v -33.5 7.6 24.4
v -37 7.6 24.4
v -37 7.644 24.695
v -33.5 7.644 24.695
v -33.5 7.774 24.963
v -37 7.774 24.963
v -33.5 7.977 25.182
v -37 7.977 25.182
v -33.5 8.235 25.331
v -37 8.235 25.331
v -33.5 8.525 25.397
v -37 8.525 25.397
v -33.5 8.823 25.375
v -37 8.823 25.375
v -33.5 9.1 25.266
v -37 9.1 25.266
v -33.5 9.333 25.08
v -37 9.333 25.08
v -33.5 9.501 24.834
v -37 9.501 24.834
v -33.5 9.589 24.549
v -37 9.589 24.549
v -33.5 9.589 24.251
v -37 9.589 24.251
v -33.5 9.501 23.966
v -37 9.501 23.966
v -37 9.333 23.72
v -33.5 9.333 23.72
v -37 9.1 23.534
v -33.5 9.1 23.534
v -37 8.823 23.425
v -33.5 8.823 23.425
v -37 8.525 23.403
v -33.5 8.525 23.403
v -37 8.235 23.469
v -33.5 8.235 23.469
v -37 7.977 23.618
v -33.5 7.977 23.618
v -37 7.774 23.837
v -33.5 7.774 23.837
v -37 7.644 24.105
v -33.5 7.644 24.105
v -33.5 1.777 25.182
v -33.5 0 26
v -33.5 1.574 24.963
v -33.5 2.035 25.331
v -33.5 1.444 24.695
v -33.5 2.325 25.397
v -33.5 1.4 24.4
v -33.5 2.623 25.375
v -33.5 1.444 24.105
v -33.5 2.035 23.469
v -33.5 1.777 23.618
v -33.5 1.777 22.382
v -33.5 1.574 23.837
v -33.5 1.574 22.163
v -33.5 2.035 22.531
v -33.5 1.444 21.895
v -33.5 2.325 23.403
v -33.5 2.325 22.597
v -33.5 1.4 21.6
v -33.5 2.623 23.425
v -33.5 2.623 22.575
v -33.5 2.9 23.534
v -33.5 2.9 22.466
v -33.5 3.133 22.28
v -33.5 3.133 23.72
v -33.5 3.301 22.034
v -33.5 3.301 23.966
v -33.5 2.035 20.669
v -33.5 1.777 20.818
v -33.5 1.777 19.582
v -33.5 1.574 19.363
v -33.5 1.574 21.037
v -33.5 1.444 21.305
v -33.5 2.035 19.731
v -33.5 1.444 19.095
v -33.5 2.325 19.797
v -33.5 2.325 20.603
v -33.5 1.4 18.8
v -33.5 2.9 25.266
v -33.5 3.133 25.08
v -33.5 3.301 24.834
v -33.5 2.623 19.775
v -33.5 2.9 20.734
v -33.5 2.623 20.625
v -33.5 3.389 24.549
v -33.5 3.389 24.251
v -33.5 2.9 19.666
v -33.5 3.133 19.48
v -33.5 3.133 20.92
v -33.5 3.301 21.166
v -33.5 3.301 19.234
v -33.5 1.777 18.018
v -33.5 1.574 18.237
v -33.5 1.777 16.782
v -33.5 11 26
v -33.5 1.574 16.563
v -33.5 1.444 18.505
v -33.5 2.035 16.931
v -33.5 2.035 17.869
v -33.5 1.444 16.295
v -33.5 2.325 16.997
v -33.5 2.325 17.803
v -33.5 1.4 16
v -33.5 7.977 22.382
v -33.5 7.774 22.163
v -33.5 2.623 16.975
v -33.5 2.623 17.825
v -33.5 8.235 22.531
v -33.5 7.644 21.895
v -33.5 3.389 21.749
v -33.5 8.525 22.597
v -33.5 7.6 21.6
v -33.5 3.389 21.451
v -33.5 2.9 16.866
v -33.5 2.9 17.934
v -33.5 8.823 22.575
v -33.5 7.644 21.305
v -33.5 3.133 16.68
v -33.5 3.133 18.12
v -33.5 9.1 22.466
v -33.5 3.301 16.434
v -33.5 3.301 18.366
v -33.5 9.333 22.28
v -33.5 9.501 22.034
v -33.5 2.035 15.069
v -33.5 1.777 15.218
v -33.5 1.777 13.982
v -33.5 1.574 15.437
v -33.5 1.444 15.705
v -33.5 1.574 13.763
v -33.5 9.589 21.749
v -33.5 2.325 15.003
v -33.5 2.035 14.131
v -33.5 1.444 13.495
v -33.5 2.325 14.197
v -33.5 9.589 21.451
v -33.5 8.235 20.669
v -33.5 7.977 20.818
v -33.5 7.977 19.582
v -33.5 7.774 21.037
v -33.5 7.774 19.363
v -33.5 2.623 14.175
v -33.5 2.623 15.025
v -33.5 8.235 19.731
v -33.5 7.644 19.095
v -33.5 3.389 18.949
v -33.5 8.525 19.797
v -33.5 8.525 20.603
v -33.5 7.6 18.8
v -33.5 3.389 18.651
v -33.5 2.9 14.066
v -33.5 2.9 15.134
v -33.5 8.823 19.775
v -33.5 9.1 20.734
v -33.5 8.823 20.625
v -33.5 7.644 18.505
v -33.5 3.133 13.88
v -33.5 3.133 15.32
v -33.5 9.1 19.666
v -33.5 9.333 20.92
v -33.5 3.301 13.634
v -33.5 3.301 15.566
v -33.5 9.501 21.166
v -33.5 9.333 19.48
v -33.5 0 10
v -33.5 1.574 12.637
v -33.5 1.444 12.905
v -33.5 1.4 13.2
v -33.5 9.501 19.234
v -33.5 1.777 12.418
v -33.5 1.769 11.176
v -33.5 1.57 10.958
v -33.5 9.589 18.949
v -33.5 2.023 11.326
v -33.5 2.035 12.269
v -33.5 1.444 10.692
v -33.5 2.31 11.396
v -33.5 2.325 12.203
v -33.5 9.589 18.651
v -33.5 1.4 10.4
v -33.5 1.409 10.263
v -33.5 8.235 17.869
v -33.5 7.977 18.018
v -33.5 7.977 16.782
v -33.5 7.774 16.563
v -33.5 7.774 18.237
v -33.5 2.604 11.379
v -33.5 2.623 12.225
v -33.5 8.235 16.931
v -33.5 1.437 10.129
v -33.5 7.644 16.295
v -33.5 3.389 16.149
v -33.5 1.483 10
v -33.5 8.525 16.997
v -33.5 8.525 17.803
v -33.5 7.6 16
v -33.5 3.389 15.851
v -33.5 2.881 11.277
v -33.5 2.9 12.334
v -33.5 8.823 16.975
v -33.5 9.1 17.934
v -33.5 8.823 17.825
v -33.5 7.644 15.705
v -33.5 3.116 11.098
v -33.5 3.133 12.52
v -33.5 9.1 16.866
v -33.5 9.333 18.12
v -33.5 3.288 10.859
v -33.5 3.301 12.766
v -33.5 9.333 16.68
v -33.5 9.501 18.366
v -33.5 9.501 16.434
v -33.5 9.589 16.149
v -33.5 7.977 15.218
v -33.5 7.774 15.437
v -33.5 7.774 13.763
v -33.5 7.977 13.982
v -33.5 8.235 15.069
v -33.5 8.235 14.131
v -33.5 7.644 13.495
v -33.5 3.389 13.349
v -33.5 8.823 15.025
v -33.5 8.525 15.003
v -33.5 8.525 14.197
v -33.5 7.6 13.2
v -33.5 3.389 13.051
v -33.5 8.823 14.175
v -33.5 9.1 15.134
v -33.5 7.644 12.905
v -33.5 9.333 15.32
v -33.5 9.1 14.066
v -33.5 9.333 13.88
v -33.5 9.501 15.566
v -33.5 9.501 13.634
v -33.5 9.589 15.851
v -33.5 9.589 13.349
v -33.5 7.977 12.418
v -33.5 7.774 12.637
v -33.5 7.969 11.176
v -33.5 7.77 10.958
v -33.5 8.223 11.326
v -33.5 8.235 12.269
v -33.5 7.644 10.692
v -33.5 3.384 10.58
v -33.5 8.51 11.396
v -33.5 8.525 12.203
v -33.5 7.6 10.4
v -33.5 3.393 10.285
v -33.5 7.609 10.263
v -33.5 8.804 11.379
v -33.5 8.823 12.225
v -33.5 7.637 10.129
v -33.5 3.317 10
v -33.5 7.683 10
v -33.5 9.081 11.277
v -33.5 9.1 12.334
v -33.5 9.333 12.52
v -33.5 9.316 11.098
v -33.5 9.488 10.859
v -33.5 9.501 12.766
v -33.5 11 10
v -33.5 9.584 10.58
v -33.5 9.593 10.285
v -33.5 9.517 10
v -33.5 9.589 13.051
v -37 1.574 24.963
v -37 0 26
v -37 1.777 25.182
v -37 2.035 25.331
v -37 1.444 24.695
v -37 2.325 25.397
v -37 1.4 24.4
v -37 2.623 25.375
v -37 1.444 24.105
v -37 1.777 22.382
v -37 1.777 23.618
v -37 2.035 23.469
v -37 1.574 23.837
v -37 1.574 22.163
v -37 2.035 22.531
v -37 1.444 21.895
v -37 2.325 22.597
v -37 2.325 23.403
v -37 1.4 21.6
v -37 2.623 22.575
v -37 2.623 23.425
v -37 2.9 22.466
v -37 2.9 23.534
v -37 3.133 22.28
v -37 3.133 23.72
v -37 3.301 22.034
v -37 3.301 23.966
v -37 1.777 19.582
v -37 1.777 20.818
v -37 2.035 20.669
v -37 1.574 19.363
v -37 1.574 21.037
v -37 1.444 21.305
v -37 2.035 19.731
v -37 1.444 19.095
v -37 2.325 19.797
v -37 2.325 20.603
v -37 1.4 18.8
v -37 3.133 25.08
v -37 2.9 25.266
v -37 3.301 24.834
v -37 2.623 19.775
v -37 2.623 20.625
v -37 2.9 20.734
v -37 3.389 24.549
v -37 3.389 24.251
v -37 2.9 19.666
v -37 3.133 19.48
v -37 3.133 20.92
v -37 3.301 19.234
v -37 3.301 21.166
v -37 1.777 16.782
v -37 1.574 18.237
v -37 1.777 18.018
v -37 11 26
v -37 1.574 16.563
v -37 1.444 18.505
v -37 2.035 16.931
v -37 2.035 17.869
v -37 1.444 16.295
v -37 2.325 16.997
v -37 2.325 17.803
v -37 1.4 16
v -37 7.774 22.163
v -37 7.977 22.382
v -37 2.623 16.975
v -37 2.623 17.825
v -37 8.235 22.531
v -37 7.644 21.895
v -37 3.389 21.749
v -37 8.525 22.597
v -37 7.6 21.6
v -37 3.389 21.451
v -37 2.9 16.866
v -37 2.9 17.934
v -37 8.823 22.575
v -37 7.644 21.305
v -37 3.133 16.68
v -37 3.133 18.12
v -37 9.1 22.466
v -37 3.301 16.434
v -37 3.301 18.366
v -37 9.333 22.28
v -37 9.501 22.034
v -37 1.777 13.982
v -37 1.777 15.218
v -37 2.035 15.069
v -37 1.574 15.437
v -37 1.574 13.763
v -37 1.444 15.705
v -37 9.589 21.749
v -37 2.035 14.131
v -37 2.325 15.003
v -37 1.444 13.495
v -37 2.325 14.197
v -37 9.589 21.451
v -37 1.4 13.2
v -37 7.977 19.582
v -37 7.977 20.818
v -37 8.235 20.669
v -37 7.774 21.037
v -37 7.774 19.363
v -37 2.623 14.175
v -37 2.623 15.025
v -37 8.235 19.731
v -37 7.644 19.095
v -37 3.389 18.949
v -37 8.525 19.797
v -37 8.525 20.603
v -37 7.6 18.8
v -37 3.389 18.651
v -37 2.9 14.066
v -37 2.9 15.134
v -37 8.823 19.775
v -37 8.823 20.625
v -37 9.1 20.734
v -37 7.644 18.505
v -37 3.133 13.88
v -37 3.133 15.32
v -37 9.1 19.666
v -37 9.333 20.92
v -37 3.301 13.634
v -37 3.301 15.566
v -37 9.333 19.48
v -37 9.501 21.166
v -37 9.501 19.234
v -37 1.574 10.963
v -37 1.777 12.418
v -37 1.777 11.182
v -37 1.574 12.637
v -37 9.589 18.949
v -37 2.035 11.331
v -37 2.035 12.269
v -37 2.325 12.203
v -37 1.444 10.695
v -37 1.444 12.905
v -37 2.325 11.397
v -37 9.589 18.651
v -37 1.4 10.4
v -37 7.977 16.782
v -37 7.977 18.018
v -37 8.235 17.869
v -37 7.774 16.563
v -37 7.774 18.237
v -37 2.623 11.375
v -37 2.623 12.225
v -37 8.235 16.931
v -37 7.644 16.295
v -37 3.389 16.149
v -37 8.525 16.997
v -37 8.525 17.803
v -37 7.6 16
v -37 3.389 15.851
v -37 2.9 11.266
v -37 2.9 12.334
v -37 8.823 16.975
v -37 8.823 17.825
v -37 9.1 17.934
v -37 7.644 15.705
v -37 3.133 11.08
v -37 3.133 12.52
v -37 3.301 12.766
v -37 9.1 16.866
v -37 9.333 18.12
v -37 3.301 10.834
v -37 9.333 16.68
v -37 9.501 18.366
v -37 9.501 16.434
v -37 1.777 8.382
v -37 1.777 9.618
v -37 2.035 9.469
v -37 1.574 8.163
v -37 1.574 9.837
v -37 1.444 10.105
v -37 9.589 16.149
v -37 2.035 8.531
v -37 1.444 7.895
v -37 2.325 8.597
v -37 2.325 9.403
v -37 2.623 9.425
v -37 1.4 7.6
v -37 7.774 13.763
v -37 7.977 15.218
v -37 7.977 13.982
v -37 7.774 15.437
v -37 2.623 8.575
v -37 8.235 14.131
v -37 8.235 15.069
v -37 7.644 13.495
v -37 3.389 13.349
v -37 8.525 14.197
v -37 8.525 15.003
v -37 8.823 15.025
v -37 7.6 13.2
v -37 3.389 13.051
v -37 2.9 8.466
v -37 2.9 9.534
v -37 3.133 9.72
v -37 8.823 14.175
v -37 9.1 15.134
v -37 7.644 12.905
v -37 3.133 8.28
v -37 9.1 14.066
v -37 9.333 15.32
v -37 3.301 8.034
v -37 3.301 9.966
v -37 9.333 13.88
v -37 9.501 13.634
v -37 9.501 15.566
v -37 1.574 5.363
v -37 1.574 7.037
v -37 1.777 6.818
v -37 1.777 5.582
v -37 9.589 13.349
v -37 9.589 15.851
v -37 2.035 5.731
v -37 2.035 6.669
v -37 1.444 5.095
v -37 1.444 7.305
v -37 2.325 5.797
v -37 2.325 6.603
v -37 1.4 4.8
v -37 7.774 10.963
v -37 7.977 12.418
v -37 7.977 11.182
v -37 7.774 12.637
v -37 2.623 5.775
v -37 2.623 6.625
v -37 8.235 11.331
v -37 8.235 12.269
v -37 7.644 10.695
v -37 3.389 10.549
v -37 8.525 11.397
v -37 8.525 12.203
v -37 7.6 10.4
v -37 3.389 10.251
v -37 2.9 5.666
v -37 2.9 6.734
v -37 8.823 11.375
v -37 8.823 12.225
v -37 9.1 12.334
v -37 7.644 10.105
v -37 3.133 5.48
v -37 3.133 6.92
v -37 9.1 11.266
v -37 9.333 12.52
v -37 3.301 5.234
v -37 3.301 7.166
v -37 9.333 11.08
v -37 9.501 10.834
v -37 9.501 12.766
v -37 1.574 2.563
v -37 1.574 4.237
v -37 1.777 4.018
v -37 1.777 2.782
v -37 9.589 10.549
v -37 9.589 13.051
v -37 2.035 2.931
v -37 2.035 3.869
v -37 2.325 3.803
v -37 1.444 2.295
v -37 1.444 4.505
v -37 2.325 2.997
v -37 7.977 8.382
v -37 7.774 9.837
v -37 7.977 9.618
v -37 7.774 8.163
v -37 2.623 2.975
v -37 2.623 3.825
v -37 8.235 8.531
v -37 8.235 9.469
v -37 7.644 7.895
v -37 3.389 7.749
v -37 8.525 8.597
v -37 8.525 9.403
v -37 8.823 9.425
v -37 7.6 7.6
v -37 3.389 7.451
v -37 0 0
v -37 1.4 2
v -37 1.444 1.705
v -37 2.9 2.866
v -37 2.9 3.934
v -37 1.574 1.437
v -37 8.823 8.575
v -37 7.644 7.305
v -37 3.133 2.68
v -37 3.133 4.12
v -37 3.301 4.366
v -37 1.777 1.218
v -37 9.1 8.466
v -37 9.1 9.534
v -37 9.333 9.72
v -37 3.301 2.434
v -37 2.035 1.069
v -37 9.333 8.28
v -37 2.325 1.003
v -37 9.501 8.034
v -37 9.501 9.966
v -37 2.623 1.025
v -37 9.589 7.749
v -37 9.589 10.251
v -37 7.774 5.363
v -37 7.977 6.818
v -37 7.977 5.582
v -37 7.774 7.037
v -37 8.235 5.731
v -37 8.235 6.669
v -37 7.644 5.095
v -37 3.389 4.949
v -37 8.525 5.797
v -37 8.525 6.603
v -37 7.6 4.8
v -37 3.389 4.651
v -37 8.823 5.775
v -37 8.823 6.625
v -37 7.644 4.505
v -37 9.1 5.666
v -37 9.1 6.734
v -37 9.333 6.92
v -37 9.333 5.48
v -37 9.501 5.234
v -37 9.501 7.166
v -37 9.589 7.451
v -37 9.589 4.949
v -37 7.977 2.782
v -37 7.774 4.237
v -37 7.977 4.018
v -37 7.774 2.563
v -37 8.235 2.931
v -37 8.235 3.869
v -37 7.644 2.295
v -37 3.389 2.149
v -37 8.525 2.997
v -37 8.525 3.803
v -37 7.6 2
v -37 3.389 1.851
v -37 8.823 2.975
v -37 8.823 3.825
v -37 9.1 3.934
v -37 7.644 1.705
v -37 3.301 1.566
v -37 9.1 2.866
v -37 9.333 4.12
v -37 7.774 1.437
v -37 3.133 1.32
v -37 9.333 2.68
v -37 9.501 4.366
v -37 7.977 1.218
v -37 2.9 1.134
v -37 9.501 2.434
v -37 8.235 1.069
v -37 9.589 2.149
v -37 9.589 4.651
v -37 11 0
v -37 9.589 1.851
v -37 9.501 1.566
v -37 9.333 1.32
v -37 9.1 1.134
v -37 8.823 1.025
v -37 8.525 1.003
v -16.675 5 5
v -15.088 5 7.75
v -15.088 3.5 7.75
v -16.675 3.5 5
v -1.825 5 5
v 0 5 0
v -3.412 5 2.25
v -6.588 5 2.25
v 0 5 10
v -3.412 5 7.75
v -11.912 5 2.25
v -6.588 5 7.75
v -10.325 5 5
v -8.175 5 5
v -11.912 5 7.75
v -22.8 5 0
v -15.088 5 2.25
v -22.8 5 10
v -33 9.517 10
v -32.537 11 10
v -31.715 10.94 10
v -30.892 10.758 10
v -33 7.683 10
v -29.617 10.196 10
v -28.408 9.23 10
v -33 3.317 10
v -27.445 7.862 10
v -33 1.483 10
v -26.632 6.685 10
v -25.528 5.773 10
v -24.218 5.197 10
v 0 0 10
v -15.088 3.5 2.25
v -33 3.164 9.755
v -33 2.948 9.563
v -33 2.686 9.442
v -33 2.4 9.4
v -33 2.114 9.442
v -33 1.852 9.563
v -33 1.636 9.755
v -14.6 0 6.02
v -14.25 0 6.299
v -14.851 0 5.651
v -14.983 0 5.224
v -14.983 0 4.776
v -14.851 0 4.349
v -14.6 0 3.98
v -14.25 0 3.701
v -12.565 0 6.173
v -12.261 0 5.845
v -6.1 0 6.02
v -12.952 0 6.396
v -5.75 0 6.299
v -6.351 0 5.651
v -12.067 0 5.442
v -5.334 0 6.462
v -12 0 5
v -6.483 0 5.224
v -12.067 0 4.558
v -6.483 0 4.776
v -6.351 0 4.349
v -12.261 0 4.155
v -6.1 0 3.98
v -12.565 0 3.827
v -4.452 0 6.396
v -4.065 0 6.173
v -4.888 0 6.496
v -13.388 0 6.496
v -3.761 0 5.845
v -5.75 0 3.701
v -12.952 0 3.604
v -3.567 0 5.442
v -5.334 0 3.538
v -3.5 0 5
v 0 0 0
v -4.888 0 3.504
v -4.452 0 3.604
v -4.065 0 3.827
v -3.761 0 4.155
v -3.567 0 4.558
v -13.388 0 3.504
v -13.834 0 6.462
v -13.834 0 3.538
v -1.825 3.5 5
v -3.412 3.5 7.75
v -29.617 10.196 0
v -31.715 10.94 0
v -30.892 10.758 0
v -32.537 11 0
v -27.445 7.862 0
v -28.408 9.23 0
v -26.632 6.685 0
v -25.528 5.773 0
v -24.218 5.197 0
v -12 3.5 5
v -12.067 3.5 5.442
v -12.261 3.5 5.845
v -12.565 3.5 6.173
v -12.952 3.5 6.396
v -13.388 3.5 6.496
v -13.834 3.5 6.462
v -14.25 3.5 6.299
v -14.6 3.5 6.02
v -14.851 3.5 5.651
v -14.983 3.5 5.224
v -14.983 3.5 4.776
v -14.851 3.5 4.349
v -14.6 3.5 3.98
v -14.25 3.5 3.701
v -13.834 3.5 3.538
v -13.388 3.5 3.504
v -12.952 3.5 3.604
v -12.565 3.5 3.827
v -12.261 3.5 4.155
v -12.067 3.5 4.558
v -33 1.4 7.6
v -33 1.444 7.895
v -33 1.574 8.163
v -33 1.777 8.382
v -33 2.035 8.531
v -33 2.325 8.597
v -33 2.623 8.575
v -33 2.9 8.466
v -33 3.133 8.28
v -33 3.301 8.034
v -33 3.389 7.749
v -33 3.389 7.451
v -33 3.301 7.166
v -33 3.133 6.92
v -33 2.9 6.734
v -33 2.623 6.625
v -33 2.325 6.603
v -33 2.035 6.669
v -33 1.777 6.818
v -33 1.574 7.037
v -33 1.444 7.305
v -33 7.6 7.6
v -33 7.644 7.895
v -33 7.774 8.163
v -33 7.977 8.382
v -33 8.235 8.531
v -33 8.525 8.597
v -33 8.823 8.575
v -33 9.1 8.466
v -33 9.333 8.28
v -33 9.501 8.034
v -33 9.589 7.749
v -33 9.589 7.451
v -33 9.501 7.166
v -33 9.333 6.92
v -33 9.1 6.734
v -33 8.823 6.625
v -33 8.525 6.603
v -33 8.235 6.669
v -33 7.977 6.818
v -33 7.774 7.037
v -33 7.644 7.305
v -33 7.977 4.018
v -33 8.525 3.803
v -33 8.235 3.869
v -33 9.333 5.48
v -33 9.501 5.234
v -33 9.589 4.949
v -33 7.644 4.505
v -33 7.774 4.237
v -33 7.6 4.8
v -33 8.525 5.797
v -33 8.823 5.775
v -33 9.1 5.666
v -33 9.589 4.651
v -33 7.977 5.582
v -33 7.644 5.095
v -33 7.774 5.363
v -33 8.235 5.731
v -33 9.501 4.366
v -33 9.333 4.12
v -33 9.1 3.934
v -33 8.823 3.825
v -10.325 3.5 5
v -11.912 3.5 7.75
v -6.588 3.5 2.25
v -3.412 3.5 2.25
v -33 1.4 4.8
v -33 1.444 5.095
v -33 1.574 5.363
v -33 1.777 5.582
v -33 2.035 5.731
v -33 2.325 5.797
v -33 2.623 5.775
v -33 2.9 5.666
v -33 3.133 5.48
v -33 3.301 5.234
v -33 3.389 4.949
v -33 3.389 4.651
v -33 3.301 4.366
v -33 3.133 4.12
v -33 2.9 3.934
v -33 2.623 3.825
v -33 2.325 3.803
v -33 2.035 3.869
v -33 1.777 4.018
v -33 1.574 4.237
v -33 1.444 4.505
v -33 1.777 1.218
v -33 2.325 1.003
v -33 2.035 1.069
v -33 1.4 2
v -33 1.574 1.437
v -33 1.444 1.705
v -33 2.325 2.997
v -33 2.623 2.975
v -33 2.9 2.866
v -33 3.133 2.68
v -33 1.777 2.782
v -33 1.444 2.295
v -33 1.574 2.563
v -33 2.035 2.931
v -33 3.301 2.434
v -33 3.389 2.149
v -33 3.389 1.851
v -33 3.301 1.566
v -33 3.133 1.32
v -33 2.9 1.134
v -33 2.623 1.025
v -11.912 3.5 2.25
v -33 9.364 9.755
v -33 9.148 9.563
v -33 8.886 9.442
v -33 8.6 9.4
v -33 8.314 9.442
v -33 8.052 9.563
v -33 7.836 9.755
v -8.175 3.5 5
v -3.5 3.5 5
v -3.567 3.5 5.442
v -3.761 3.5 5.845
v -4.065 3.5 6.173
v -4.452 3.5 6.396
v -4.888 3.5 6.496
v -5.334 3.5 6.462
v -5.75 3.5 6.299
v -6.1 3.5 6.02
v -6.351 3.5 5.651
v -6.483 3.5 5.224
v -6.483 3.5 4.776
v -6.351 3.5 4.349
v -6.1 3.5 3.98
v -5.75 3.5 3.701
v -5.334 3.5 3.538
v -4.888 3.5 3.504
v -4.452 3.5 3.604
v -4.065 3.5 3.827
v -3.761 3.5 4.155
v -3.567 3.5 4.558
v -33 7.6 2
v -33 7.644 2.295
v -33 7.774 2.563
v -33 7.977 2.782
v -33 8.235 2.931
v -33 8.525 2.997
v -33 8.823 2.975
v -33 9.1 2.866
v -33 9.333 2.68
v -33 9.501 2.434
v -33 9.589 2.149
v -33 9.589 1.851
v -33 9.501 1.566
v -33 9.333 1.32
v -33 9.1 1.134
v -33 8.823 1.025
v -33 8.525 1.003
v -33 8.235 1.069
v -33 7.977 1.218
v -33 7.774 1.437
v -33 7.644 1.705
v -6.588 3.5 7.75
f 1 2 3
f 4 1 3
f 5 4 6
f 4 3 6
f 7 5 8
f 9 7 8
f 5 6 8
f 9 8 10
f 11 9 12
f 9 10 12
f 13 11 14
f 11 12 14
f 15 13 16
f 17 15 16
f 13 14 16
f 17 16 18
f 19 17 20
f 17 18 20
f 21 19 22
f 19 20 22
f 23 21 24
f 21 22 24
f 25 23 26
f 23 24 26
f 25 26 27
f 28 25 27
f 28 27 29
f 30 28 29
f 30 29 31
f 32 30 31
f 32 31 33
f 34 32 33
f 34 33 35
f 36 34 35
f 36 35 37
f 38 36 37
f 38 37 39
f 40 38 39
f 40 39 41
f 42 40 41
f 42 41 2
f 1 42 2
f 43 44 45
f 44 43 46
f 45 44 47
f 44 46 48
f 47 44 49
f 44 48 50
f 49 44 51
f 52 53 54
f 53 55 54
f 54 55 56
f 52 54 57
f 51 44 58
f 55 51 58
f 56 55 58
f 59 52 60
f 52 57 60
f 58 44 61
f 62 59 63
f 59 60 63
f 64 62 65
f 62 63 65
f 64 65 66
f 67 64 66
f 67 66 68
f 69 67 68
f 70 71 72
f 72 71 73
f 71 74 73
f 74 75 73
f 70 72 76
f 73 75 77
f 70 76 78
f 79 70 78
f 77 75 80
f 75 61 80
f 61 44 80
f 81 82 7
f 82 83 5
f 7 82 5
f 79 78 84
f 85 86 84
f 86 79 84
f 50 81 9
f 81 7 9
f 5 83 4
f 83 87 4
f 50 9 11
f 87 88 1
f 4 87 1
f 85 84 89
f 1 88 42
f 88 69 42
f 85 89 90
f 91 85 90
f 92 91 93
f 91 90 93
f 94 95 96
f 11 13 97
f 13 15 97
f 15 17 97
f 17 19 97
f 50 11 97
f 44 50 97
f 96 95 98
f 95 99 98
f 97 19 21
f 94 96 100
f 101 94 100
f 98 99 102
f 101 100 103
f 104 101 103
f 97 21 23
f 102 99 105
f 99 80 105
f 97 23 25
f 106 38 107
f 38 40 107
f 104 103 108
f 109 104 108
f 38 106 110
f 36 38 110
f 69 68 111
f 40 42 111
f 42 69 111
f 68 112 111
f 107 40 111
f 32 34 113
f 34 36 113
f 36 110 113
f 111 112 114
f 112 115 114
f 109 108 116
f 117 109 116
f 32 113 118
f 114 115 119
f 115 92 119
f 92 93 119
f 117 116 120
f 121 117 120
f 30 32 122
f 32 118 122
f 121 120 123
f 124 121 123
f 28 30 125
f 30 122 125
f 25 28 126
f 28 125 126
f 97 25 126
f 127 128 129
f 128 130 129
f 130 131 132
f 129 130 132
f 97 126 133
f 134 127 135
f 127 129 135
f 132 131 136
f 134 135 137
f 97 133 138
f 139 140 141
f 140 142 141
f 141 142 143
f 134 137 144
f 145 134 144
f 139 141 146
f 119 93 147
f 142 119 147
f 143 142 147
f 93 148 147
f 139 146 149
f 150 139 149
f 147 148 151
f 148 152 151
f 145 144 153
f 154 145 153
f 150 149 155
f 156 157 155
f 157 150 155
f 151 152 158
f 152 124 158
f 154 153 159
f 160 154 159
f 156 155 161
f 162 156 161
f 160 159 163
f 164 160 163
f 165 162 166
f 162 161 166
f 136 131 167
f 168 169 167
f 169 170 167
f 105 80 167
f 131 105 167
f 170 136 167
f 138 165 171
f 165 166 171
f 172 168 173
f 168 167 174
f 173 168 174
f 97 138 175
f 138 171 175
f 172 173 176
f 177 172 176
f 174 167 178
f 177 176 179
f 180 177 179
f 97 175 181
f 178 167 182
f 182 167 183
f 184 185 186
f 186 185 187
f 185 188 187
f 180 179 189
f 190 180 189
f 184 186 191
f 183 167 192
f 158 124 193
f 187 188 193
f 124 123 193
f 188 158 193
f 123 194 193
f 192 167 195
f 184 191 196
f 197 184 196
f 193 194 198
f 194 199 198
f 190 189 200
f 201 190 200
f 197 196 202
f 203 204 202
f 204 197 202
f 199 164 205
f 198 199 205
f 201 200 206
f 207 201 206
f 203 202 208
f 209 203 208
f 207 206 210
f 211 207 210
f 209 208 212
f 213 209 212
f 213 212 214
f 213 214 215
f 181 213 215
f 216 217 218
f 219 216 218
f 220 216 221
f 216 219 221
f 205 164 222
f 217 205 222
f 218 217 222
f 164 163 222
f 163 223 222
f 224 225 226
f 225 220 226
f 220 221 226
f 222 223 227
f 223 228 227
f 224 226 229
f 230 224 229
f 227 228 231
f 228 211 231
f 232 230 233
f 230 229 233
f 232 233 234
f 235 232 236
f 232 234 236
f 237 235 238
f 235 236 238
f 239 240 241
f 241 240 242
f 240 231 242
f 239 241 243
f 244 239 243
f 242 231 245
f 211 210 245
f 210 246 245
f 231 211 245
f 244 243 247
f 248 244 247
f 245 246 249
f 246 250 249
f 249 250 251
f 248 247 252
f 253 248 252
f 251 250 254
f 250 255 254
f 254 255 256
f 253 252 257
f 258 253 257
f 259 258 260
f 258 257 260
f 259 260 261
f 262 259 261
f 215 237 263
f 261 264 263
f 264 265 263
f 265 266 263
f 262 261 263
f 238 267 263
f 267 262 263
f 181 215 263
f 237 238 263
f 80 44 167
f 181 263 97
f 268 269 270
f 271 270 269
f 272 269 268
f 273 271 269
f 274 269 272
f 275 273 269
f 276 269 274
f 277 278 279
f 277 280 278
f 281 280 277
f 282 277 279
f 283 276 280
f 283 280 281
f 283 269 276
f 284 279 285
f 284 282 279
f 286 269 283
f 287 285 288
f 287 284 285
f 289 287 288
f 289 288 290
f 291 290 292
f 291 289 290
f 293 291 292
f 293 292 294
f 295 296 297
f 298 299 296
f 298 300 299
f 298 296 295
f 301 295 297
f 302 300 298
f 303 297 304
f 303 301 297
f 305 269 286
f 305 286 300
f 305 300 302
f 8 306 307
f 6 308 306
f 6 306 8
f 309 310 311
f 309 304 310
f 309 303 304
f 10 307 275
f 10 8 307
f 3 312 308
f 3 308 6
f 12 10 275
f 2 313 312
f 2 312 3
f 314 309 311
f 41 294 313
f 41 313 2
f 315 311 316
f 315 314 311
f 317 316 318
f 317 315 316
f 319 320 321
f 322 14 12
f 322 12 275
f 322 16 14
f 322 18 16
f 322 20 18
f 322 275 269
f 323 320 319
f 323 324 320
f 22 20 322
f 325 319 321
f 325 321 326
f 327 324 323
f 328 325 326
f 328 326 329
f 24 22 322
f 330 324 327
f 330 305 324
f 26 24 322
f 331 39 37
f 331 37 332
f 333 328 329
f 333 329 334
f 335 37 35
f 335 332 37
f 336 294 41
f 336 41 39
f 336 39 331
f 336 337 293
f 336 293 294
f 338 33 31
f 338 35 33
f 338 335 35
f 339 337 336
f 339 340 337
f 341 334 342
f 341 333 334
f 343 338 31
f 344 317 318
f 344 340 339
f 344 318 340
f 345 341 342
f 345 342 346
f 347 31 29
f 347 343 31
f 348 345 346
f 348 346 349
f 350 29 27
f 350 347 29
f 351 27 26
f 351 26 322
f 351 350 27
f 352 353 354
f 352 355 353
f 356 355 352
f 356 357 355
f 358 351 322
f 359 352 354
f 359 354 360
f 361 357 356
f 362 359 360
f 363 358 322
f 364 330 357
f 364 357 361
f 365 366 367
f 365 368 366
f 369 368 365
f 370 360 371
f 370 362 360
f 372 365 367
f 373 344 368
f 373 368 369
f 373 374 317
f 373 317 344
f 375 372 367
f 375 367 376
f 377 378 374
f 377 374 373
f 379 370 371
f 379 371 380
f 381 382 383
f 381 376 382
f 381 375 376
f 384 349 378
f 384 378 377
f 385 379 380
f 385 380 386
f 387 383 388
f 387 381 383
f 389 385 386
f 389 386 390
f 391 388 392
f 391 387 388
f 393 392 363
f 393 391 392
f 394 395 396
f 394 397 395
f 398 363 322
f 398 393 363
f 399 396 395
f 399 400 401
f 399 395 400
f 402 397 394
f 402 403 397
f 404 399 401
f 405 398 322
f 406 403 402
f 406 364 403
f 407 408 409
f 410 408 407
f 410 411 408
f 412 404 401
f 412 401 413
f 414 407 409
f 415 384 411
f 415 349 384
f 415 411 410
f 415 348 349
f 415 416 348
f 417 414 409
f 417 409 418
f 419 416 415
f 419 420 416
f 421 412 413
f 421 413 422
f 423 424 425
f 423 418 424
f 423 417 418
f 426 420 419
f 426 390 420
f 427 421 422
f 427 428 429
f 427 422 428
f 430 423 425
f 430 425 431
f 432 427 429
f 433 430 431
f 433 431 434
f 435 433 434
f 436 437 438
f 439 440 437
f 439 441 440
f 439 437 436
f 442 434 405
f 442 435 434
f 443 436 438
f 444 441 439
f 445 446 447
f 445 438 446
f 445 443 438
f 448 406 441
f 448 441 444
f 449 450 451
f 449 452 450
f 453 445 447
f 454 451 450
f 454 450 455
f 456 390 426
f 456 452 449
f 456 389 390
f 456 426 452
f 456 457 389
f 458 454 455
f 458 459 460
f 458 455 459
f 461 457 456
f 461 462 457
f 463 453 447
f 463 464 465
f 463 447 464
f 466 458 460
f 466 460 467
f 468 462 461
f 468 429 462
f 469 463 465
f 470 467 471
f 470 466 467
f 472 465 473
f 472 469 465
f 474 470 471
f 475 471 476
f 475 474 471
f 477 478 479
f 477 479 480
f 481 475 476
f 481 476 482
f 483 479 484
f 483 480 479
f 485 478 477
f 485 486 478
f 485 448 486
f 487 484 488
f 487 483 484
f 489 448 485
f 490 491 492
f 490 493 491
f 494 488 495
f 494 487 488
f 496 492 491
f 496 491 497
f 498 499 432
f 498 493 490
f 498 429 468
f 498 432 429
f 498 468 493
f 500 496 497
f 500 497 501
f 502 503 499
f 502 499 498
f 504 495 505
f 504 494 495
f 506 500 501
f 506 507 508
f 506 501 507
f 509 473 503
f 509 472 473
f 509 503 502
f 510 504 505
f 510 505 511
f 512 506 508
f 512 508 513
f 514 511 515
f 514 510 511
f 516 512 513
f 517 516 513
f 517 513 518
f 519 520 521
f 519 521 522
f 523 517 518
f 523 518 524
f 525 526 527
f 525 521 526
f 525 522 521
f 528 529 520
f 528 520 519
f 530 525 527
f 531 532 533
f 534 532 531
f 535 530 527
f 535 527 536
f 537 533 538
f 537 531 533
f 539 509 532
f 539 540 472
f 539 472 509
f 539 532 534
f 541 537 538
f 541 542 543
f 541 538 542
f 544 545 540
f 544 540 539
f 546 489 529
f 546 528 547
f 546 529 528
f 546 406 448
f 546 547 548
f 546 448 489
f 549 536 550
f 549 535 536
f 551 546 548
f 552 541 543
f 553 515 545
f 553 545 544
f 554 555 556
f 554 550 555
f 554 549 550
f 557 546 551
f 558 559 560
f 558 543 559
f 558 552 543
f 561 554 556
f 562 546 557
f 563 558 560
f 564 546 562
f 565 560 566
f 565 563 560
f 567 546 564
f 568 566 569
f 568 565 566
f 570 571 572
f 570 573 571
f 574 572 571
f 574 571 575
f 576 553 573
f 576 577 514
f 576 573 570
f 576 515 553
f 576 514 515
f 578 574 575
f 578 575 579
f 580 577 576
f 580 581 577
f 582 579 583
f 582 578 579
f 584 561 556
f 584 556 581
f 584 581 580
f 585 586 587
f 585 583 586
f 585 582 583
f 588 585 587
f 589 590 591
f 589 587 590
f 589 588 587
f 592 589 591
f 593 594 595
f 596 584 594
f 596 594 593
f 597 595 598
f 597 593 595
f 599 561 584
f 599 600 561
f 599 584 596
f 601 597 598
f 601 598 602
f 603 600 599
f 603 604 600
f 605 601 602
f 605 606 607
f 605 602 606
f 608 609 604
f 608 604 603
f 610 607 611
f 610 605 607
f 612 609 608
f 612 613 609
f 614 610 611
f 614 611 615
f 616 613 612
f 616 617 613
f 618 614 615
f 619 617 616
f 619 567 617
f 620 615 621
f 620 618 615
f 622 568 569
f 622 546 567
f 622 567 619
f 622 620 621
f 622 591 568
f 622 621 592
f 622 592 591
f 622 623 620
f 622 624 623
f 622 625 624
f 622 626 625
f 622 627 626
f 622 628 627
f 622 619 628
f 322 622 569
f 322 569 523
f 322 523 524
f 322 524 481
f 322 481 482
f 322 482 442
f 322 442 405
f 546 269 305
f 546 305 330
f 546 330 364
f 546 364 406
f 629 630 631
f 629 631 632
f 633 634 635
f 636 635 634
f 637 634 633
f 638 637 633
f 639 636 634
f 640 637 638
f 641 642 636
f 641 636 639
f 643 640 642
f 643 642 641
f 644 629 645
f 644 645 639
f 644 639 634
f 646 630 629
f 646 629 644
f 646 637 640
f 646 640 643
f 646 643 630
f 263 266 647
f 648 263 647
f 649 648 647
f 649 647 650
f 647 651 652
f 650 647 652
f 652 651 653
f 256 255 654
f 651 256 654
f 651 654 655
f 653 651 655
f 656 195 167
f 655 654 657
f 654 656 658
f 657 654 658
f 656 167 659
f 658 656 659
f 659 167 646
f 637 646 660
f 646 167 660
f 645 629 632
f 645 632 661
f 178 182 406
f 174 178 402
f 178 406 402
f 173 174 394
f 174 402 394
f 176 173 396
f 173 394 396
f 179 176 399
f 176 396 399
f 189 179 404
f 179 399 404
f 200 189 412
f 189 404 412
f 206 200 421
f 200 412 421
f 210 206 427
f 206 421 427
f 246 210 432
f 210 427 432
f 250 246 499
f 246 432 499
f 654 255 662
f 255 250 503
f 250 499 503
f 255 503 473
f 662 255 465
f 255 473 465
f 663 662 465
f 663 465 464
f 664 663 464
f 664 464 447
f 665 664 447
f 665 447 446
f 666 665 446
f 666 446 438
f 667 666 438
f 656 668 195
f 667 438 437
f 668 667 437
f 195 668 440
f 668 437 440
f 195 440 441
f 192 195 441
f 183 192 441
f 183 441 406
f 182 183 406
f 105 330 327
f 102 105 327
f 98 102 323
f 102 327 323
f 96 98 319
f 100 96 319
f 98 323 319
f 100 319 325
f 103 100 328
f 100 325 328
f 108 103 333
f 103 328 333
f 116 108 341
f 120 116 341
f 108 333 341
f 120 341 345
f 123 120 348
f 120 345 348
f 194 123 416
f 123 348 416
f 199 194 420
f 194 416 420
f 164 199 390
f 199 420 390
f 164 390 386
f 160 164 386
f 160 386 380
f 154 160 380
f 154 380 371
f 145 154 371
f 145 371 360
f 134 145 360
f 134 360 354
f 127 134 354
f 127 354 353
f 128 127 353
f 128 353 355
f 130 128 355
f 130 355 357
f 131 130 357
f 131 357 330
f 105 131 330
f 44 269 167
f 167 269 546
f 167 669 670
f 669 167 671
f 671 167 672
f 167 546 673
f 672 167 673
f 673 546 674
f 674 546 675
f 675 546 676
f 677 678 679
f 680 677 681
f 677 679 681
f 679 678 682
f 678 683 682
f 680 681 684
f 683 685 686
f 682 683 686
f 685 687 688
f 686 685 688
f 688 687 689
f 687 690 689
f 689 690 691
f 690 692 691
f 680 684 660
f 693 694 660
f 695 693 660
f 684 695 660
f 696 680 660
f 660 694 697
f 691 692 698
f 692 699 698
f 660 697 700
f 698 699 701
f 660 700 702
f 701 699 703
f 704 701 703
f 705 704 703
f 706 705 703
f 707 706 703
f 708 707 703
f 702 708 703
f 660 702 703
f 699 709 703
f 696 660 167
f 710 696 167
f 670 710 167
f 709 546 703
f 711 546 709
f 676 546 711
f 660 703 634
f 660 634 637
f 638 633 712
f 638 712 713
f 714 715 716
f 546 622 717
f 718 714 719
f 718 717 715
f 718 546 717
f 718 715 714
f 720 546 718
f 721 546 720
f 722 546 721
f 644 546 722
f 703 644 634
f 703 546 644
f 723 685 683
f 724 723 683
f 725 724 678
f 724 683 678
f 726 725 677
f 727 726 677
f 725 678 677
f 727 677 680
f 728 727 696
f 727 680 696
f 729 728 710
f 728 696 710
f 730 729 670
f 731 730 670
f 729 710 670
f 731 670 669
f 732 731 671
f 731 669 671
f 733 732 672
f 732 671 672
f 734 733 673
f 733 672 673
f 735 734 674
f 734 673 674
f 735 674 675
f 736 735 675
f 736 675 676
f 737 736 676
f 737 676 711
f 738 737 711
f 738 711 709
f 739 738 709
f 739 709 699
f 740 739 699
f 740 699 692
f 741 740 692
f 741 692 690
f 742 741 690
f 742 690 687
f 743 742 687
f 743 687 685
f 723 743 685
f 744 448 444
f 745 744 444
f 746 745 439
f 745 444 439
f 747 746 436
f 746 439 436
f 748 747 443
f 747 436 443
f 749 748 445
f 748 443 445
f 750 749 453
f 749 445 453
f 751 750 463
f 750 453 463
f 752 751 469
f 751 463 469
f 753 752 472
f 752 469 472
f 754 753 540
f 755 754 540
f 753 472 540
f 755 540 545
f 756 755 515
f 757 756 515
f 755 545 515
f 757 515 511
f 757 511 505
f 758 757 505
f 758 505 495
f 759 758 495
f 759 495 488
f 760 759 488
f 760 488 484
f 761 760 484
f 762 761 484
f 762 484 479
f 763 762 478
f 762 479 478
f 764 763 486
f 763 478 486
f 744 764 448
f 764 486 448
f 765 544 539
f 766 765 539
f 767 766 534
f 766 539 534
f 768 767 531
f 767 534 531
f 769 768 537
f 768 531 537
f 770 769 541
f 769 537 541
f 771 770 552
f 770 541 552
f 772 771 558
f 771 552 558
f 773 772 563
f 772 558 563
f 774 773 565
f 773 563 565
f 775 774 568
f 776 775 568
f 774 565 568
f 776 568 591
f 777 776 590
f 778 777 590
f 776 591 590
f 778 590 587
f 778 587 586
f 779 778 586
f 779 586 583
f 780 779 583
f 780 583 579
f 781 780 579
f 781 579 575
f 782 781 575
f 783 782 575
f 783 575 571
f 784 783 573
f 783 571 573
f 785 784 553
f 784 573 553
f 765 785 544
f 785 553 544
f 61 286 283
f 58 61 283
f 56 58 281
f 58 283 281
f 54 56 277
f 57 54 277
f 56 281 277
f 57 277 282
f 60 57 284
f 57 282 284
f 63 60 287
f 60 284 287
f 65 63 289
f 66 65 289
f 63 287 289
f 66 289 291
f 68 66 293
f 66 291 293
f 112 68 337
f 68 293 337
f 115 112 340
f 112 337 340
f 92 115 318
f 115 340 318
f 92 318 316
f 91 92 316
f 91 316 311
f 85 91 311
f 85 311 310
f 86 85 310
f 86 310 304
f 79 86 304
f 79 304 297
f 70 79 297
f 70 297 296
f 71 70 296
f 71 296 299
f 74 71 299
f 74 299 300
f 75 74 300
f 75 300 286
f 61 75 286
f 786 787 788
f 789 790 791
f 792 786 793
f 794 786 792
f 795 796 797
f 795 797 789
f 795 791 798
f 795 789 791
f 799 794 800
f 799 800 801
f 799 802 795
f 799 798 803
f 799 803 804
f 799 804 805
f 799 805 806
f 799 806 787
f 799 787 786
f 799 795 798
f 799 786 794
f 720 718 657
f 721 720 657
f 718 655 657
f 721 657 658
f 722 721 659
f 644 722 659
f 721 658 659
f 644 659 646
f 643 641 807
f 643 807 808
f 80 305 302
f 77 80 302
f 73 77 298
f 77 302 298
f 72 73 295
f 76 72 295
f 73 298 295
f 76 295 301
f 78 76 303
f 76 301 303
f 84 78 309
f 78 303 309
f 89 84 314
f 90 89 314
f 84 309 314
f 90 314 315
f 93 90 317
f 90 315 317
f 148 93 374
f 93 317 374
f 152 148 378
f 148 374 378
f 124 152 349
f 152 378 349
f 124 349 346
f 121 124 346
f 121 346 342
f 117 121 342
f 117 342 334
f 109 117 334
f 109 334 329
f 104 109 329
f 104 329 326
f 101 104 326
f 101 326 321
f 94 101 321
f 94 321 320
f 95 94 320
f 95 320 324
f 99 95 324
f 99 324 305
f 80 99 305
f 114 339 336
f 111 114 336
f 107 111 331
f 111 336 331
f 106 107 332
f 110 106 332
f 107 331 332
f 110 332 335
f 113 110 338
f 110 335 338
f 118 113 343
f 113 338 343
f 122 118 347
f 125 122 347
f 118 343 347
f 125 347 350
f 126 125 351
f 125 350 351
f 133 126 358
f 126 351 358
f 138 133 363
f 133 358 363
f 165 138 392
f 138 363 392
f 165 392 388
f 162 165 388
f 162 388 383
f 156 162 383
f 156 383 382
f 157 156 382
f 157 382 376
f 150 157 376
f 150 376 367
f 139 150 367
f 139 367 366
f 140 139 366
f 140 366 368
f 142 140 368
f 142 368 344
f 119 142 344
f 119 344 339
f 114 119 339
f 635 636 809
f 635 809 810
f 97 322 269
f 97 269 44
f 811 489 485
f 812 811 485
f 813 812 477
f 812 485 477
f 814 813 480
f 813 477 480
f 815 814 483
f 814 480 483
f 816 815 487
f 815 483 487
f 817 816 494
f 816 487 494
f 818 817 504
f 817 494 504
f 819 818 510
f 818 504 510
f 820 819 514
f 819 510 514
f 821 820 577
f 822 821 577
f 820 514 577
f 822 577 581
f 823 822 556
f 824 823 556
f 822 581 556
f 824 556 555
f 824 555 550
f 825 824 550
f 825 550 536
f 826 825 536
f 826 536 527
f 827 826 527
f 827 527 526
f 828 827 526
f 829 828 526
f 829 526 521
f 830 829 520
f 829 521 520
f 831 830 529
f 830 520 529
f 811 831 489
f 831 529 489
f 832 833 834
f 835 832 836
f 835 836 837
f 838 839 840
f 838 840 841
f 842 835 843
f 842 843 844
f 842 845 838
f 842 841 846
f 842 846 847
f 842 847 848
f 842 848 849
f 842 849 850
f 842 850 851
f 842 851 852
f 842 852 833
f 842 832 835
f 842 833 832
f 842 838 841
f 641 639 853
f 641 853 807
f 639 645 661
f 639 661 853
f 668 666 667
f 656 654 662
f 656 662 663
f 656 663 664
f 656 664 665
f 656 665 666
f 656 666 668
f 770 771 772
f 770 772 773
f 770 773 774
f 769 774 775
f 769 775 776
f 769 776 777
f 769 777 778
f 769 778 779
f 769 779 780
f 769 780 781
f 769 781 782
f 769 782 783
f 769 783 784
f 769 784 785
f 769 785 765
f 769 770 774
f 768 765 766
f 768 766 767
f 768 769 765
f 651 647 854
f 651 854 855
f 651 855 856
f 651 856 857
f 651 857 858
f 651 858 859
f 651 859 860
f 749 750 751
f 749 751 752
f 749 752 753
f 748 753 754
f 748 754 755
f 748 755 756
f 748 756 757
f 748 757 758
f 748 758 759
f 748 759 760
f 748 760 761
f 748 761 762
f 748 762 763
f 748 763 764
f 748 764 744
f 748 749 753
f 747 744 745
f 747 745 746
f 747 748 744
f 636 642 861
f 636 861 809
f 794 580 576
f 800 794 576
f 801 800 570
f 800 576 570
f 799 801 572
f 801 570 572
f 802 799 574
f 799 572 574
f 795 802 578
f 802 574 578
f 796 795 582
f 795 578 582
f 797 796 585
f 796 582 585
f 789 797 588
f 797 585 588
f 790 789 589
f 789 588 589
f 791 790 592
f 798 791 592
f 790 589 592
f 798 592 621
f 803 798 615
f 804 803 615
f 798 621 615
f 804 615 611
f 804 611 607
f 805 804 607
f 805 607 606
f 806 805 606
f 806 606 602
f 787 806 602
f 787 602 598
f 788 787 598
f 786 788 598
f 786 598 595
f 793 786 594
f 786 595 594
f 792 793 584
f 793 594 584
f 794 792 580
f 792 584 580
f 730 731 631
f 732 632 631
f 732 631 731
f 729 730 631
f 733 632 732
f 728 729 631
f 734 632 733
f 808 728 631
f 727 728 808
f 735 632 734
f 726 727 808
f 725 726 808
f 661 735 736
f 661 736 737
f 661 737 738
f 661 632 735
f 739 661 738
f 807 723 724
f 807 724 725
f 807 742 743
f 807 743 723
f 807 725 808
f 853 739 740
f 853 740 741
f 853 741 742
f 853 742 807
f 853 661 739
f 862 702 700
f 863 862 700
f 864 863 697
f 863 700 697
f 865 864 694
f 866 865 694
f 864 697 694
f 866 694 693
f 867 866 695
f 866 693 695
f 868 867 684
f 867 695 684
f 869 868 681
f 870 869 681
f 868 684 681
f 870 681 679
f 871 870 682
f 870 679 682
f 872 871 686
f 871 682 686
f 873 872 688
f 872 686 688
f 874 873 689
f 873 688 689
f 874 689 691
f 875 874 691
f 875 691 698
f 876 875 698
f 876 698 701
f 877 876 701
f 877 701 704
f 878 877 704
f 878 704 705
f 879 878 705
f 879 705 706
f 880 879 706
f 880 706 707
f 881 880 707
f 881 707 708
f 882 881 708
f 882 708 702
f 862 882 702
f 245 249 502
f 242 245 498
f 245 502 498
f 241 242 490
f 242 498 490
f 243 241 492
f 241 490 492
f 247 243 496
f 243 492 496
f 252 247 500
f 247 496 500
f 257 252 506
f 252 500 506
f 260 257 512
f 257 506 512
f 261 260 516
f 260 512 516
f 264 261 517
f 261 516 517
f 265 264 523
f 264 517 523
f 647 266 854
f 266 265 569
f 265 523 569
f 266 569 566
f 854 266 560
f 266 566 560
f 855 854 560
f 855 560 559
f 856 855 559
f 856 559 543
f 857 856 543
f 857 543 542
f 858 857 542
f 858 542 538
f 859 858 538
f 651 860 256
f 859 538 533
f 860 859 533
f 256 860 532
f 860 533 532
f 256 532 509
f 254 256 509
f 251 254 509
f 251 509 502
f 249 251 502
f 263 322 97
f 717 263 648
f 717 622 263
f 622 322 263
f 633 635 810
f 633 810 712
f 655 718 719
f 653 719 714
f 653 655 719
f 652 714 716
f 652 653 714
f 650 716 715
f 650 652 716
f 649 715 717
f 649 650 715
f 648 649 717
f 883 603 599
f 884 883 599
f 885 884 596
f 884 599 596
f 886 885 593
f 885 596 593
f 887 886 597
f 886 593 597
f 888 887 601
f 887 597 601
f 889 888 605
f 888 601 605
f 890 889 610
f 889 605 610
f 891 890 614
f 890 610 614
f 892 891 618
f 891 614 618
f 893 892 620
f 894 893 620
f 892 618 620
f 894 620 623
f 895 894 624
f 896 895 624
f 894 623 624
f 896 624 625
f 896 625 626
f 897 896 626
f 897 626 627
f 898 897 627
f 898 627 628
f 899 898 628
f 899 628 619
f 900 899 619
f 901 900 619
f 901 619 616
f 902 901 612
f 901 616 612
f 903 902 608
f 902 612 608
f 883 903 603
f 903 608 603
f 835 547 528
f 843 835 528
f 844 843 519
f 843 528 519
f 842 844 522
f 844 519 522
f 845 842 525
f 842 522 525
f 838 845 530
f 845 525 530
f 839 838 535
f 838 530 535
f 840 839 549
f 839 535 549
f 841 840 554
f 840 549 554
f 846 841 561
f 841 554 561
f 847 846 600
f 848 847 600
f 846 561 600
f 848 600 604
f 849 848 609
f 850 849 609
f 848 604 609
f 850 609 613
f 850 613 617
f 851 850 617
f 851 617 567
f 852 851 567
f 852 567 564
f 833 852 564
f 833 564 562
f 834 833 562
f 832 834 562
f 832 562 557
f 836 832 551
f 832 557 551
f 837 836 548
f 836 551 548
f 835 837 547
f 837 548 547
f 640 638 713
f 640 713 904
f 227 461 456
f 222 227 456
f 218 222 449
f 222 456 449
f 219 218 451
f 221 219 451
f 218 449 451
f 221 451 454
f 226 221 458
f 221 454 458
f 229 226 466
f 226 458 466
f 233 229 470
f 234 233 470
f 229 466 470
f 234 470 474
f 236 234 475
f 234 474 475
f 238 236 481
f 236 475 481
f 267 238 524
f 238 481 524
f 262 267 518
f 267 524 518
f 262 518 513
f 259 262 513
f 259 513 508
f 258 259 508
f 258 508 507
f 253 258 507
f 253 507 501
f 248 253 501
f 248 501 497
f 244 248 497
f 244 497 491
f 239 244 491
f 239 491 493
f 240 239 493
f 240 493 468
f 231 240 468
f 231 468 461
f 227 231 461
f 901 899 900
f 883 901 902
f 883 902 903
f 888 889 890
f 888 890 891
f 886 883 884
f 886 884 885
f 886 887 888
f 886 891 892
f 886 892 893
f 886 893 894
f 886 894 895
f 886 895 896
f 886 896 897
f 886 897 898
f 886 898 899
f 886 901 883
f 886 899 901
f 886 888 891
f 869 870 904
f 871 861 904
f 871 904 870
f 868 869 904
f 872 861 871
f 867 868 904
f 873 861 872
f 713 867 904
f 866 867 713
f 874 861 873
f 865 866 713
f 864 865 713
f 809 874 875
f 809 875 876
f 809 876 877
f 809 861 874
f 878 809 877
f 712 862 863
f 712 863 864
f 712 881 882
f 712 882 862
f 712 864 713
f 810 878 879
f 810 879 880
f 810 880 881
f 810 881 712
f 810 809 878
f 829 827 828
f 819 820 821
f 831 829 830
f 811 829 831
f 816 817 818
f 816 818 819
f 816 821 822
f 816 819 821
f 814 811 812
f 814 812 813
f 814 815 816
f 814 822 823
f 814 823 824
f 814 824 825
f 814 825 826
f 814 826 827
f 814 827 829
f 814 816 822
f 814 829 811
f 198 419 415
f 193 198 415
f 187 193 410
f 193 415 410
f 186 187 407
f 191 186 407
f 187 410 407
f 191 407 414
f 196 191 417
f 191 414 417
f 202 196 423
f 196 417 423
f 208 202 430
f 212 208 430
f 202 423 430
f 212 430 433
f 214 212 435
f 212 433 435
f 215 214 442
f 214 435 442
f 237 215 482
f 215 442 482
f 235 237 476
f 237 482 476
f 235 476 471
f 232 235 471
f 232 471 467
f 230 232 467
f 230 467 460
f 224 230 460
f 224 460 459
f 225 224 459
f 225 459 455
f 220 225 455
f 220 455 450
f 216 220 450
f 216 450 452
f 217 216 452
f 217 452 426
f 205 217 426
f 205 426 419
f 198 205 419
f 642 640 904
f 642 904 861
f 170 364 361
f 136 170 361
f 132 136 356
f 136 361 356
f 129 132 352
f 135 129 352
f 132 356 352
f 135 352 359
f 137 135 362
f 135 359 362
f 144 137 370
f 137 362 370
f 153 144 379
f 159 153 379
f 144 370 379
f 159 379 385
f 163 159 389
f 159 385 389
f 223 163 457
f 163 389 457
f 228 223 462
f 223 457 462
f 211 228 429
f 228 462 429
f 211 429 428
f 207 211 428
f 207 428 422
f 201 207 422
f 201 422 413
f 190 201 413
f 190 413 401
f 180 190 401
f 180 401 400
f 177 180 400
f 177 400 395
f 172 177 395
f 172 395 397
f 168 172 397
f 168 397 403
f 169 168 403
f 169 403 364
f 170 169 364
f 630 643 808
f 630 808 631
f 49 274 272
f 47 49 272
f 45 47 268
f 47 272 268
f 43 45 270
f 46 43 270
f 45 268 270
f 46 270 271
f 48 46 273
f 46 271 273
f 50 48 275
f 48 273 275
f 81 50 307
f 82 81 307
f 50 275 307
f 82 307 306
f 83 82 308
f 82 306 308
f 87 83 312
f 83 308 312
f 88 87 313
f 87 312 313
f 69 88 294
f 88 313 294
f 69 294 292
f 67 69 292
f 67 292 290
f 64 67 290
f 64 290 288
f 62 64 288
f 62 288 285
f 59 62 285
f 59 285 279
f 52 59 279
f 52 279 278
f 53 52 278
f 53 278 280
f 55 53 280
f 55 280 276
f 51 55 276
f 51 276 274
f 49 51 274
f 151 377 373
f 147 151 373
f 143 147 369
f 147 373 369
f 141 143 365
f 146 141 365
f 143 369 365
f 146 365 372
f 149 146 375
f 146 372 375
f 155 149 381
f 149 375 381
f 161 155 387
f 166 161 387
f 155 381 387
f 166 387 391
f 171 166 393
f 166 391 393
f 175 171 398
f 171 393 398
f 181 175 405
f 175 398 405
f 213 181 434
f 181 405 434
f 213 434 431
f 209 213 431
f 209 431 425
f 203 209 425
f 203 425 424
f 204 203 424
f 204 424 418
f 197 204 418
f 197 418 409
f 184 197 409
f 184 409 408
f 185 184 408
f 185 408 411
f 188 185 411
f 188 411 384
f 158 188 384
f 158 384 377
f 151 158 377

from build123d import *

# Parameters (mm, degrees)
F0_W     = 37
F0_H     = 10
F0_R     = 1.5
F1_DEPTH = 11
F2_W     = 3.5
F2_H     = 11
F3_DEPTH = 16
F4_W     = 28
F4_H     = 10
F5_DEPTH = 6
F6_DEPTH = 7.5
F7_DEPTH = 7.5
F8_R     = 1
F9_DEPTH = 4
F10_R    = 5.2
F11_R    = 5.7


with BuildPart() as f1:
    # F0 (on Front) → F1 (new body)
    with BuildSketch(Plane.XZ):
        with Locations((-18.5, 5)):
            Rectangle(F0_W, F0_H)
        with Locations((-13.5, 5)):
            Circle(F0_R, mode=Mode.SUBTRACT)
        with Locations((-5, 5)):
            Circle(F0_R, mode=Mode.SUBTRACT)
    extrude(amount=-F1_DEPTH)

    # F2 (on face) → F3 (join)
    with BuildSketch(Plane.XY.offset(10)):
        with Locations((-35.25, 5.5)):
            Rectangle(F2_W, F2_H)
    extrude(amount=F3_DEPTH)

    # F4 (on face) → F5 (cut)
    with BuildSketch(Plane(origin=(0, 11, 0), x_dir=(-1, 0, 0), z_dir=(0, 1, 0))):
        with Locations((14, 5)):
            Rectangle(F4_W, F4_H)
        Polygon((6.5877132403, 7.75), (8.1754264805, 5), (6.5877132403, 2.25), (3.4122867597, 2.25), (1.8245735195, 5), (3.4122867597, 7.75), align=None, mode=Mode.SUBTRACT)
        Polygon((16.6754264805, 5), (15.0877132403, 2.25), (11.9122867597, 2.25), (10.3245735195, 5), (11.9122867597, 7.75), (15.0877132403, 7.75), align=None, mode=Mode.SUBTRACT)
    extrude(amount=-F5_DEPTH, mode=Mode.SUBTRACT)

    # F6 (cut): a face of the model
    f6_faces = [f1.faces().sort_by_distance(p)[0] for p in [
        (-2.6911883006, 11, 3.6670069439),
    ]]
    extrude(f6_faces, amount=-F6_DEPTH, mode=Mode.SUBTRACT)

    # F7 (cut): a face of the model
    f7_faces = [f1.faces().sort_by_distance(p)[0] for p in [
        (-13.5, 11, 7.6659861123),
    ]]
    extrude(f7_faces, amount=-F7_DEPTH, mode=Mode.SUBTRACT)

    # F8 (on face) → F9 (cut)
    with BuildSketch(Plane(origin=(-37, 0, 0), x_dir=(0, -1, 0), z_dir=(-1, 0, 0))):
        with Locations((-8.6, 2)):
            Circle(F8_R)
        with Locations((-2.4, 2)):
            Circle(F8_R)
        with Locations((-2.4, 4.8)):
            Circle(F8_R)
        with Locations((-8.6, 4.8)):
            Circle(F8_R)
        with Locations((-2.4, 7.6)):
            Circle(F8_R)
        with Locations((-8.6, 7.6)):
            Circle(F8_R)
        with Locations((-2.4, 10.4)):
            Circle(F8_R)
        with Locations((-8.6, 10.4)):
            Circle(F8_R)
        with Locations((-2.4, 13.2)):
            Circle(F8_R)
        with Locations((-8.6, 13.2)):
            Circle(F8_R)
        with Locations((-2.4, 16)):
            Circle(F8_R)
        with Locations((-8.6, 16)):
            Circle(F8_R)
        with Locations((-2.4, 18.8)):
            Circle(F8_R)
        with Locations((-8.6, 18.8)):
            Circle(F8_R)
        with Locations((-2.4, 21.6)):
            Circle(F8_R)
        with Locations((-8.6, 21.6)):
            Circle(F8_R)
        with Locations((-2.4, 24.4)):
            Circle(F8_R)
        with Locations((-8.6, 24.4)):
            Circle(F8_R)
    extrude(amount=-F9_DEPTH, mode=Mode.SUBTRACT)

    # F10
    f10_edges = [f1.edges().sort_by_distance(p)[0] for p in [
        (-28, 5, 5),
    ]]
    fillet(f10_edges, radius=F10_R)

    # F11
    f11_edges = [f1.edges().sort_by_distance(p)[0] for p in [
        (-28, 11, 5),
    ]]
    fillet(f11_edges, radius=F11_R)


solid = f1.part
